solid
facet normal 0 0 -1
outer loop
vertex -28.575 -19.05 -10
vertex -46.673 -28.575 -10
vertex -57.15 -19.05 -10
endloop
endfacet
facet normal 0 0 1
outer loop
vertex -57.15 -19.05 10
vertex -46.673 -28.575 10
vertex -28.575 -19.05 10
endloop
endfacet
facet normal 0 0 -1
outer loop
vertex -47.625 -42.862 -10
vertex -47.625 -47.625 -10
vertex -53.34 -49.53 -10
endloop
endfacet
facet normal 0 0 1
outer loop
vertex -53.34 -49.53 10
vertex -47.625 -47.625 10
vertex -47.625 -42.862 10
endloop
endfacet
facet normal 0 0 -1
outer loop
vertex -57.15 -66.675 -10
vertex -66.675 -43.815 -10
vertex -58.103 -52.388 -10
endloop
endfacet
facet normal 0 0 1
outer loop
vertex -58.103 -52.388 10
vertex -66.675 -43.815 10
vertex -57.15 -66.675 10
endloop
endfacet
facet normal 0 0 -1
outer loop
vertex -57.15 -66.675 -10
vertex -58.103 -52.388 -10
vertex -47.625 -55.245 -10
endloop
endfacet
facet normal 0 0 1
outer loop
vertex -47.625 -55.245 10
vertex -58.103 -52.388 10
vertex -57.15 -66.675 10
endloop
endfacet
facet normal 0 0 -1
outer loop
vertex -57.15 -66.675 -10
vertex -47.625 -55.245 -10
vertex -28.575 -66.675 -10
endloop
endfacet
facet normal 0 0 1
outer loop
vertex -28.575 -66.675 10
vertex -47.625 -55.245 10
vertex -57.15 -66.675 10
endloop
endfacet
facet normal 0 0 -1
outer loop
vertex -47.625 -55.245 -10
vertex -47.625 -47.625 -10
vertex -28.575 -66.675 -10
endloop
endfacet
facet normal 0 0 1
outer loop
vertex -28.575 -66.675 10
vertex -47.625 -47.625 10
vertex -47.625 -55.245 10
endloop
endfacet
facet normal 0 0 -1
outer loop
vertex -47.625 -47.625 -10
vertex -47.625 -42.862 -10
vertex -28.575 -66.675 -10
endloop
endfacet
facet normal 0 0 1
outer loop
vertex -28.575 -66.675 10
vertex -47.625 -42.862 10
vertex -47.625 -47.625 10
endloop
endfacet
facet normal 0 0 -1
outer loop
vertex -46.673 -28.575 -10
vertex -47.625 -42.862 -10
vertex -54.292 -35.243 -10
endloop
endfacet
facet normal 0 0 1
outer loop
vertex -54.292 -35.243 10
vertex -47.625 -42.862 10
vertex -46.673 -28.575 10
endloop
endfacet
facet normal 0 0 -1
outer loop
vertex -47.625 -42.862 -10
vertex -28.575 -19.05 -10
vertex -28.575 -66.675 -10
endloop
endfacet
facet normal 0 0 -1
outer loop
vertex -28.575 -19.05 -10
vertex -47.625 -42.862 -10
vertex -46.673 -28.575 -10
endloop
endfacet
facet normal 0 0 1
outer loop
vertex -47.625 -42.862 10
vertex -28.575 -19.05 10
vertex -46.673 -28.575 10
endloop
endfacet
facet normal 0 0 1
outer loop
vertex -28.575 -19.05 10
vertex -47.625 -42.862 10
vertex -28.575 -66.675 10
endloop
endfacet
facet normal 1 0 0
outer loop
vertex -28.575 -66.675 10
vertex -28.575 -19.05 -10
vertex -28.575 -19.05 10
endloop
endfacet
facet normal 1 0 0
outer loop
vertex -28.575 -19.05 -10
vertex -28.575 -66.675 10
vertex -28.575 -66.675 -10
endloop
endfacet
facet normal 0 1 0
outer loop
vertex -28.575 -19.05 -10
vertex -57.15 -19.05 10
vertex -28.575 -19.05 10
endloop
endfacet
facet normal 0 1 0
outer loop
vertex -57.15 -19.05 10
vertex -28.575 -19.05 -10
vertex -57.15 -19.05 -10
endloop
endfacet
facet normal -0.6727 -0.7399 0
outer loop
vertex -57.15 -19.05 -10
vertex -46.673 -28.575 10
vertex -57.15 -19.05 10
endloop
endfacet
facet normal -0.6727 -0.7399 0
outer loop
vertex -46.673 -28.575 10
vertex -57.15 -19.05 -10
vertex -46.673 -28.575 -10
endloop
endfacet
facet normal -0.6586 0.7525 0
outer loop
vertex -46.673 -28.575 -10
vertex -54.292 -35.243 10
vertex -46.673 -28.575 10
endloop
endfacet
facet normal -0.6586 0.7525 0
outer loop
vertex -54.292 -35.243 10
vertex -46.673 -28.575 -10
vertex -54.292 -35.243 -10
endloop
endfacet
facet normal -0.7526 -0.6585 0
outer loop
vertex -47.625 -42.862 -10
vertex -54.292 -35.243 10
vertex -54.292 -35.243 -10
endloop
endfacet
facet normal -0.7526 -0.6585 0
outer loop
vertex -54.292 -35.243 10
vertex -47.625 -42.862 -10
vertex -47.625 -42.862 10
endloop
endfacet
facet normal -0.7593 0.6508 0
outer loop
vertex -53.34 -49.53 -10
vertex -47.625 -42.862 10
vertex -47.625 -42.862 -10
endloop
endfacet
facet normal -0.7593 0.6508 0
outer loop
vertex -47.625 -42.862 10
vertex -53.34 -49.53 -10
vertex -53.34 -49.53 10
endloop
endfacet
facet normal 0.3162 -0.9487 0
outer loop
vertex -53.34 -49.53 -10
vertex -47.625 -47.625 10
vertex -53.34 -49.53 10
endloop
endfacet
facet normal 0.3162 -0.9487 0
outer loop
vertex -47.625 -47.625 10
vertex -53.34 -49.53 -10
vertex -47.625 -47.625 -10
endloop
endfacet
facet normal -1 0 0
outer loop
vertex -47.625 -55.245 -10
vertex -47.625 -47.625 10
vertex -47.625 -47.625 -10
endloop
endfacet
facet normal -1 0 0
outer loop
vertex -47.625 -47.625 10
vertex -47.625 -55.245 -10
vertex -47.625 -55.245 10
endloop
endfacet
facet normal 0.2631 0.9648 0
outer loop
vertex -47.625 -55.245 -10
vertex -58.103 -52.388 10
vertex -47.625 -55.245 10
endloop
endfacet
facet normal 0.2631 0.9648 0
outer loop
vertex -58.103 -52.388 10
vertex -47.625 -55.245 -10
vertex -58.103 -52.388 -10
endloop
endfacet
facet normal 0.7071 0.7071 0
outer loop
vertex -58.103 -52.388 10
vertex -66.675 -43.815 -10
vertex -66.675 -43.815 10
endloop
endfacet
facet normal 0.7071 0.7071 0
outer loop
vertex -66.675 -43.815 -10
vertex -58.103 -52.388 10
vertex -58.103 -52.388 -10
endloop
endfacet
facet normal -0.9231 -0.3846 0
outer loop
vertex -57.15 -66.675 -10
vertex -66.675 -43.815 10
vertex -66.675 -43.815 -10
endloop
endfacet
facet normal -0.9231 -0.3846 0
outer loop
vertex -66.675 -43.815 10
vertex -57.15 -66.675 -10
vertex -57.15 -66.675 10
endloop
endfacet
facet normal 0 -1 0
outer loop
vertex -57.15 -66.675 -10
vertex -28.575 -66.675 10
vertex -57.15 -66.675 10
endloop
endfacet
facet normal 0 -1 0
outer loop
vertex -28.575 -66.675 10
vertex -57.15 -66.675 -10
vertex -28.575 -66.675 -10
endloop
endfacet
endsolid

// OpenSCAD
polyhedron(
    points=[
    [-28.575, -66.675, -10],
    [-28.575, -19.05, -10],
    [-57.15, -19.05, -10],
    [-46.6725, -28.575, -10],
    [-54.2925, -35.2425, -10],
    [-47.625, -42.8625, -10],
    [-53.34, -49.53, -10],
    [-47.625, -47.625, -10],
    [-47.625, -55.245, -10],
    [-58.1025, -52.3875, -10],
    [-66.675, -43.815, -10],
    [-57.15, -66.675, -10],
    [-28.575, -66.675, 10],
    [-28.575, -19.05, 10],
    [-57.15, -19.05, 10],
    [-46.6725, -28.575, 10],
    [-54.2925, -35.2425, 10],
    [-47.625, -42.8625, 10],
    [-53.34, -49.53, 10],
    [-47.625, -47.625, 10],
    [-47.625, -55.245, 10],
    [-58.1025, -52.3875, 10],
    [-66.675, -43.815, 10],
    [-57.15, -66.675, 10],
    ],
    faces=[
        [2,3,1],
        [13,15,14],
        [6,7,5],
        [17,19,18],
        [9,10,11],
        [23,22,21],
        [8,9,11],
        [23,21,20],
        [0,8,11],
        [23,20,12],
        [0,7,8],
        [20,19,12],
        [0,5,7],
        [19,17,12],
        [4,5,3],
        [15,17,16],
        [3,5,0,1],
        [13,12,17,15],
        [0,12,13,1],
        [1,13,14,2],
        [2,14,15,3],
        [3,15,16,4],
        [4,16,17,5],
        [5,17,18,6],
        [6,18,19,7],
        [7,19,20,8],
        [8,20,21,9],
        [9,21,22,10],
        [10,22,23,11],
        [11,23,12,0],
    ]
);
